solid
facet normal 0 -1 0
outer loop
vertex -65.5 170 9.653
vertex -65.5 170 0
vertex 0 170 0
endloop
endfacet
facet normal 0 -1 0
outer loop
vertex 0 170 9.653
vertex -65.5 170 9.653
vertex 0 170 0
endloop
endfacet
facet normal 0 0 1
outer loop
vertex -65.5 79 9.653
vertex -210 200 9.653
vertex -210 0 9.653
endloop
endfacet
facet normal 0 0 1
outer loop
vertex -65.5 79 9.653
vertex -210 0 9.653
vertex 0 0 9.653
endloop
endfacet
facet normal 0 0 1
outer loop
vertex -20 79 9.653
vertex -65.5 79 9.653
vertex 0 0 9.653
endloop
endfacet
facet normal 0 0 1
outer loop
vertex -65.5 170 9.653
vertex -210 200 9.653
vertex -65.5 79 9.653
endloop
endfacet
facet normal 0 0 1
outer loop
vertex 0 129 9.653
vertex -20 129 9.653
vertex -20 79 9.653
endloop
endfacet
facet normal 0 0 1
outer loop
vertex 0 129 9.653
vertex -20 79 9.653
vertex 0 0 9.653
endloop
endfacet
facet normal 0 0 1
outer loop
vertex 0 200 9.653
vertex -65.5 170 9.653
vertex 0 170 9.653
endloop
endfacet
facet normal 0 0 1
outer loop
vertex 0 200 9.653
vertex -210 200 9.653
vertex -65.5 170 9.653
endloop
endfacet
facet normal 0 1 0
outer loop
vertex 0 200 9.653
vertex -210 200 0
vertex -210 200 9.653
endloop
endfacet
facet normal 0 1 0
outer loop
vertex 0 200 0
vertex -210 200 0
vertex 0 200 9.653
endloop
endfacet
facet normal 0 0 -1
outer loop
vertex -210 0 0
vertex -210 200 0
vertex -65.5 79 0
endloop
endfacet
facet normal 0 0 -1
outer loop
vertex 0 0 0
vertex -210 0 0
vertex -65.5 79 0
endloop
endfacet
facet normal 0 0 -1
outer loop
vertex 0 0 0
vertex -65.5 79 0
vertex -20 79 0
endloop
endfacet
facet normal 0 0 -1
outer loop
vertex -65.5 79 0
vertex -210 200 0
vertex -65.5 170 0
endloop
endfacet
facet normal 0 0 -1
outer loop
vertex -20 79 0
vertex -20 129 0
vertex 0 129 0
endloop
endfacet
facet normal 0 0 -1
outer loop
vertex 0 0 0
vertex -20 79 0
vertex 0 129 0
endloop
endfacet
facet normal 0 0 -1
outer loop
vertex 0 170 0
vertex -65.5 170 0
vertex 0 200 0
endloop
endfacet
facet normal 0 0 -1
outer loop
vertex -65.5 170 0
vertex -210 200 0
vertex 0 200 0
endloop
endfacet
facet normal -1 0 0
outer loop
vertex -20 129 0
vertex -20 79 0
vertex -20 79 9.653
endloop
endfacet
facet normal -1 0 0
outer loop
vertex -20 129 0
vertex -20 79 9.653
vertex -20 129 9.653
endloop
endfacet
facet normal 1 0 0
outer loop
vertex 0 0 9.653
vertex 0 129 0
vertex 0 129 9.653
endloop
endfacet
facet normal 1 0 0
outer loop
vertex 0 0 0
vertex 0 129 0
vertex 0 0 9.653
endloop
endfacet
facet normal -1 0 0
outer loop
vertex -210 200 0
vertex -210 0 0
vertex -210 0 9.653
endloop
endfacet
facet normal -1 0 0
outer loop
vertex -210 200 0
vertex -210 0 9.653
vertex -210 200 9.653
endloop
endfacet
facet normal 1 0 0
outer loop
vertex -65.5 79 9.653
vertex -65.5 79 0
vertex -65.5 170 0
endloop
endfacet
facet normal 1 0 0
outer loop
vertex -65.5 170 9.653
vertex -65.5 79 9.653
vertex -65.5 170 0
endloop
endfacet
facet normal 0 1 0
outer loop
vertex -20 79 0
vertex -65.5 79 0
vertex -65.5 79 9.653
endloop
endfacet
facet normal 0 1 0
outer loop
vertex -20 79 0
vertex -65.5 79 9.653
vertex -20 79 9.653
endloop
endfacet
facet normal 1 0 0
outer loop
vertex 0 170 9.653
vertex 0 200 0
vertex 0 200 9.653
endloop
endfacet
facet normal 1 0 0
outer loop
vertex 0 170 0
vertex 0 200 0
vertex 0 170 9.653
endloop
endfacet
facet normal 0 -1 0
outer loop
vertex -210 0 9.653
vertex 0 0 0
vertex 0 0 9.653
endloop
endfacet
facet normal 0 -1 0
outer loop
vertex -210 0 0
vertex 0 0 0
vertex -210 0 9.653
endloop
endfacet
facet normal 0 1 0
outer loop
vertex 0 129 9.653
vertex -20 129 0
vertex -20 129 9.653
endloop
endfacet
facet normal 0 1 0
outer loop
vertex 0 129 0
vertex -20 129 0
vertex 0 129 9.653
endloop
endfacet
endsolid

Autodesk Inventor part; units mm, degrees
ref_plane "YZ Plane" through (0, 0, 0) normal (1, 0, 0) x (0, 1, 0)
ref_plane "XZ Plane" through (0, 0, 0) normal (0, 1, 0) x (-1, 0, 0)
ref_plane "XY Plane" through (0, 0, 0) normal (0, 0, 1) x (1, 0, 0)
sketch "Sketch1" plane through (0, 0, 0) normal (0, 0, 1) x (1, 0, 0)
  line L0 (0, 0) -> (-210, 0)
  line L1 (-210, 0) -> (-210, 200)
  line L2 (-210, 200) -> (0, 200)
  line L3 (0, 200) -> (0, 0)
  line L4 (-65.5, 79) -> (-65.5, 170)
  line L5 (-65.5, 170) -> (0, 170)
  line L6 (-65.5, 79) -> (-20, 79)
  line L7 (-20, 79) -> (-20, 129)
  line L8 (-20, 129) -> (0, 129)
  line L9 (0, 129) -> (0, 170)
  point P0 (0, 149.5)
  point P1 (0, 129)
  dimension "d0" = 210
  dimension "d1" = 200
  dimension "d2" = 91
  dimension "d3" = 45.5
  dimension "d4" = 50
  dimension "d5" = 20
  dimension "d6" = 30
extrude "Extrusion1" add sketch "Sketch1" along normal blind 9.653 contours L0 L1 L2 L3 L5 L4 L6 L7 L8
sketch "Sketch2" plane through (0, 0, 9.653) normal (0, 0, 1) x (1, 0, 0)
  point P0 (0, 0)
properties part number "base1ek"
